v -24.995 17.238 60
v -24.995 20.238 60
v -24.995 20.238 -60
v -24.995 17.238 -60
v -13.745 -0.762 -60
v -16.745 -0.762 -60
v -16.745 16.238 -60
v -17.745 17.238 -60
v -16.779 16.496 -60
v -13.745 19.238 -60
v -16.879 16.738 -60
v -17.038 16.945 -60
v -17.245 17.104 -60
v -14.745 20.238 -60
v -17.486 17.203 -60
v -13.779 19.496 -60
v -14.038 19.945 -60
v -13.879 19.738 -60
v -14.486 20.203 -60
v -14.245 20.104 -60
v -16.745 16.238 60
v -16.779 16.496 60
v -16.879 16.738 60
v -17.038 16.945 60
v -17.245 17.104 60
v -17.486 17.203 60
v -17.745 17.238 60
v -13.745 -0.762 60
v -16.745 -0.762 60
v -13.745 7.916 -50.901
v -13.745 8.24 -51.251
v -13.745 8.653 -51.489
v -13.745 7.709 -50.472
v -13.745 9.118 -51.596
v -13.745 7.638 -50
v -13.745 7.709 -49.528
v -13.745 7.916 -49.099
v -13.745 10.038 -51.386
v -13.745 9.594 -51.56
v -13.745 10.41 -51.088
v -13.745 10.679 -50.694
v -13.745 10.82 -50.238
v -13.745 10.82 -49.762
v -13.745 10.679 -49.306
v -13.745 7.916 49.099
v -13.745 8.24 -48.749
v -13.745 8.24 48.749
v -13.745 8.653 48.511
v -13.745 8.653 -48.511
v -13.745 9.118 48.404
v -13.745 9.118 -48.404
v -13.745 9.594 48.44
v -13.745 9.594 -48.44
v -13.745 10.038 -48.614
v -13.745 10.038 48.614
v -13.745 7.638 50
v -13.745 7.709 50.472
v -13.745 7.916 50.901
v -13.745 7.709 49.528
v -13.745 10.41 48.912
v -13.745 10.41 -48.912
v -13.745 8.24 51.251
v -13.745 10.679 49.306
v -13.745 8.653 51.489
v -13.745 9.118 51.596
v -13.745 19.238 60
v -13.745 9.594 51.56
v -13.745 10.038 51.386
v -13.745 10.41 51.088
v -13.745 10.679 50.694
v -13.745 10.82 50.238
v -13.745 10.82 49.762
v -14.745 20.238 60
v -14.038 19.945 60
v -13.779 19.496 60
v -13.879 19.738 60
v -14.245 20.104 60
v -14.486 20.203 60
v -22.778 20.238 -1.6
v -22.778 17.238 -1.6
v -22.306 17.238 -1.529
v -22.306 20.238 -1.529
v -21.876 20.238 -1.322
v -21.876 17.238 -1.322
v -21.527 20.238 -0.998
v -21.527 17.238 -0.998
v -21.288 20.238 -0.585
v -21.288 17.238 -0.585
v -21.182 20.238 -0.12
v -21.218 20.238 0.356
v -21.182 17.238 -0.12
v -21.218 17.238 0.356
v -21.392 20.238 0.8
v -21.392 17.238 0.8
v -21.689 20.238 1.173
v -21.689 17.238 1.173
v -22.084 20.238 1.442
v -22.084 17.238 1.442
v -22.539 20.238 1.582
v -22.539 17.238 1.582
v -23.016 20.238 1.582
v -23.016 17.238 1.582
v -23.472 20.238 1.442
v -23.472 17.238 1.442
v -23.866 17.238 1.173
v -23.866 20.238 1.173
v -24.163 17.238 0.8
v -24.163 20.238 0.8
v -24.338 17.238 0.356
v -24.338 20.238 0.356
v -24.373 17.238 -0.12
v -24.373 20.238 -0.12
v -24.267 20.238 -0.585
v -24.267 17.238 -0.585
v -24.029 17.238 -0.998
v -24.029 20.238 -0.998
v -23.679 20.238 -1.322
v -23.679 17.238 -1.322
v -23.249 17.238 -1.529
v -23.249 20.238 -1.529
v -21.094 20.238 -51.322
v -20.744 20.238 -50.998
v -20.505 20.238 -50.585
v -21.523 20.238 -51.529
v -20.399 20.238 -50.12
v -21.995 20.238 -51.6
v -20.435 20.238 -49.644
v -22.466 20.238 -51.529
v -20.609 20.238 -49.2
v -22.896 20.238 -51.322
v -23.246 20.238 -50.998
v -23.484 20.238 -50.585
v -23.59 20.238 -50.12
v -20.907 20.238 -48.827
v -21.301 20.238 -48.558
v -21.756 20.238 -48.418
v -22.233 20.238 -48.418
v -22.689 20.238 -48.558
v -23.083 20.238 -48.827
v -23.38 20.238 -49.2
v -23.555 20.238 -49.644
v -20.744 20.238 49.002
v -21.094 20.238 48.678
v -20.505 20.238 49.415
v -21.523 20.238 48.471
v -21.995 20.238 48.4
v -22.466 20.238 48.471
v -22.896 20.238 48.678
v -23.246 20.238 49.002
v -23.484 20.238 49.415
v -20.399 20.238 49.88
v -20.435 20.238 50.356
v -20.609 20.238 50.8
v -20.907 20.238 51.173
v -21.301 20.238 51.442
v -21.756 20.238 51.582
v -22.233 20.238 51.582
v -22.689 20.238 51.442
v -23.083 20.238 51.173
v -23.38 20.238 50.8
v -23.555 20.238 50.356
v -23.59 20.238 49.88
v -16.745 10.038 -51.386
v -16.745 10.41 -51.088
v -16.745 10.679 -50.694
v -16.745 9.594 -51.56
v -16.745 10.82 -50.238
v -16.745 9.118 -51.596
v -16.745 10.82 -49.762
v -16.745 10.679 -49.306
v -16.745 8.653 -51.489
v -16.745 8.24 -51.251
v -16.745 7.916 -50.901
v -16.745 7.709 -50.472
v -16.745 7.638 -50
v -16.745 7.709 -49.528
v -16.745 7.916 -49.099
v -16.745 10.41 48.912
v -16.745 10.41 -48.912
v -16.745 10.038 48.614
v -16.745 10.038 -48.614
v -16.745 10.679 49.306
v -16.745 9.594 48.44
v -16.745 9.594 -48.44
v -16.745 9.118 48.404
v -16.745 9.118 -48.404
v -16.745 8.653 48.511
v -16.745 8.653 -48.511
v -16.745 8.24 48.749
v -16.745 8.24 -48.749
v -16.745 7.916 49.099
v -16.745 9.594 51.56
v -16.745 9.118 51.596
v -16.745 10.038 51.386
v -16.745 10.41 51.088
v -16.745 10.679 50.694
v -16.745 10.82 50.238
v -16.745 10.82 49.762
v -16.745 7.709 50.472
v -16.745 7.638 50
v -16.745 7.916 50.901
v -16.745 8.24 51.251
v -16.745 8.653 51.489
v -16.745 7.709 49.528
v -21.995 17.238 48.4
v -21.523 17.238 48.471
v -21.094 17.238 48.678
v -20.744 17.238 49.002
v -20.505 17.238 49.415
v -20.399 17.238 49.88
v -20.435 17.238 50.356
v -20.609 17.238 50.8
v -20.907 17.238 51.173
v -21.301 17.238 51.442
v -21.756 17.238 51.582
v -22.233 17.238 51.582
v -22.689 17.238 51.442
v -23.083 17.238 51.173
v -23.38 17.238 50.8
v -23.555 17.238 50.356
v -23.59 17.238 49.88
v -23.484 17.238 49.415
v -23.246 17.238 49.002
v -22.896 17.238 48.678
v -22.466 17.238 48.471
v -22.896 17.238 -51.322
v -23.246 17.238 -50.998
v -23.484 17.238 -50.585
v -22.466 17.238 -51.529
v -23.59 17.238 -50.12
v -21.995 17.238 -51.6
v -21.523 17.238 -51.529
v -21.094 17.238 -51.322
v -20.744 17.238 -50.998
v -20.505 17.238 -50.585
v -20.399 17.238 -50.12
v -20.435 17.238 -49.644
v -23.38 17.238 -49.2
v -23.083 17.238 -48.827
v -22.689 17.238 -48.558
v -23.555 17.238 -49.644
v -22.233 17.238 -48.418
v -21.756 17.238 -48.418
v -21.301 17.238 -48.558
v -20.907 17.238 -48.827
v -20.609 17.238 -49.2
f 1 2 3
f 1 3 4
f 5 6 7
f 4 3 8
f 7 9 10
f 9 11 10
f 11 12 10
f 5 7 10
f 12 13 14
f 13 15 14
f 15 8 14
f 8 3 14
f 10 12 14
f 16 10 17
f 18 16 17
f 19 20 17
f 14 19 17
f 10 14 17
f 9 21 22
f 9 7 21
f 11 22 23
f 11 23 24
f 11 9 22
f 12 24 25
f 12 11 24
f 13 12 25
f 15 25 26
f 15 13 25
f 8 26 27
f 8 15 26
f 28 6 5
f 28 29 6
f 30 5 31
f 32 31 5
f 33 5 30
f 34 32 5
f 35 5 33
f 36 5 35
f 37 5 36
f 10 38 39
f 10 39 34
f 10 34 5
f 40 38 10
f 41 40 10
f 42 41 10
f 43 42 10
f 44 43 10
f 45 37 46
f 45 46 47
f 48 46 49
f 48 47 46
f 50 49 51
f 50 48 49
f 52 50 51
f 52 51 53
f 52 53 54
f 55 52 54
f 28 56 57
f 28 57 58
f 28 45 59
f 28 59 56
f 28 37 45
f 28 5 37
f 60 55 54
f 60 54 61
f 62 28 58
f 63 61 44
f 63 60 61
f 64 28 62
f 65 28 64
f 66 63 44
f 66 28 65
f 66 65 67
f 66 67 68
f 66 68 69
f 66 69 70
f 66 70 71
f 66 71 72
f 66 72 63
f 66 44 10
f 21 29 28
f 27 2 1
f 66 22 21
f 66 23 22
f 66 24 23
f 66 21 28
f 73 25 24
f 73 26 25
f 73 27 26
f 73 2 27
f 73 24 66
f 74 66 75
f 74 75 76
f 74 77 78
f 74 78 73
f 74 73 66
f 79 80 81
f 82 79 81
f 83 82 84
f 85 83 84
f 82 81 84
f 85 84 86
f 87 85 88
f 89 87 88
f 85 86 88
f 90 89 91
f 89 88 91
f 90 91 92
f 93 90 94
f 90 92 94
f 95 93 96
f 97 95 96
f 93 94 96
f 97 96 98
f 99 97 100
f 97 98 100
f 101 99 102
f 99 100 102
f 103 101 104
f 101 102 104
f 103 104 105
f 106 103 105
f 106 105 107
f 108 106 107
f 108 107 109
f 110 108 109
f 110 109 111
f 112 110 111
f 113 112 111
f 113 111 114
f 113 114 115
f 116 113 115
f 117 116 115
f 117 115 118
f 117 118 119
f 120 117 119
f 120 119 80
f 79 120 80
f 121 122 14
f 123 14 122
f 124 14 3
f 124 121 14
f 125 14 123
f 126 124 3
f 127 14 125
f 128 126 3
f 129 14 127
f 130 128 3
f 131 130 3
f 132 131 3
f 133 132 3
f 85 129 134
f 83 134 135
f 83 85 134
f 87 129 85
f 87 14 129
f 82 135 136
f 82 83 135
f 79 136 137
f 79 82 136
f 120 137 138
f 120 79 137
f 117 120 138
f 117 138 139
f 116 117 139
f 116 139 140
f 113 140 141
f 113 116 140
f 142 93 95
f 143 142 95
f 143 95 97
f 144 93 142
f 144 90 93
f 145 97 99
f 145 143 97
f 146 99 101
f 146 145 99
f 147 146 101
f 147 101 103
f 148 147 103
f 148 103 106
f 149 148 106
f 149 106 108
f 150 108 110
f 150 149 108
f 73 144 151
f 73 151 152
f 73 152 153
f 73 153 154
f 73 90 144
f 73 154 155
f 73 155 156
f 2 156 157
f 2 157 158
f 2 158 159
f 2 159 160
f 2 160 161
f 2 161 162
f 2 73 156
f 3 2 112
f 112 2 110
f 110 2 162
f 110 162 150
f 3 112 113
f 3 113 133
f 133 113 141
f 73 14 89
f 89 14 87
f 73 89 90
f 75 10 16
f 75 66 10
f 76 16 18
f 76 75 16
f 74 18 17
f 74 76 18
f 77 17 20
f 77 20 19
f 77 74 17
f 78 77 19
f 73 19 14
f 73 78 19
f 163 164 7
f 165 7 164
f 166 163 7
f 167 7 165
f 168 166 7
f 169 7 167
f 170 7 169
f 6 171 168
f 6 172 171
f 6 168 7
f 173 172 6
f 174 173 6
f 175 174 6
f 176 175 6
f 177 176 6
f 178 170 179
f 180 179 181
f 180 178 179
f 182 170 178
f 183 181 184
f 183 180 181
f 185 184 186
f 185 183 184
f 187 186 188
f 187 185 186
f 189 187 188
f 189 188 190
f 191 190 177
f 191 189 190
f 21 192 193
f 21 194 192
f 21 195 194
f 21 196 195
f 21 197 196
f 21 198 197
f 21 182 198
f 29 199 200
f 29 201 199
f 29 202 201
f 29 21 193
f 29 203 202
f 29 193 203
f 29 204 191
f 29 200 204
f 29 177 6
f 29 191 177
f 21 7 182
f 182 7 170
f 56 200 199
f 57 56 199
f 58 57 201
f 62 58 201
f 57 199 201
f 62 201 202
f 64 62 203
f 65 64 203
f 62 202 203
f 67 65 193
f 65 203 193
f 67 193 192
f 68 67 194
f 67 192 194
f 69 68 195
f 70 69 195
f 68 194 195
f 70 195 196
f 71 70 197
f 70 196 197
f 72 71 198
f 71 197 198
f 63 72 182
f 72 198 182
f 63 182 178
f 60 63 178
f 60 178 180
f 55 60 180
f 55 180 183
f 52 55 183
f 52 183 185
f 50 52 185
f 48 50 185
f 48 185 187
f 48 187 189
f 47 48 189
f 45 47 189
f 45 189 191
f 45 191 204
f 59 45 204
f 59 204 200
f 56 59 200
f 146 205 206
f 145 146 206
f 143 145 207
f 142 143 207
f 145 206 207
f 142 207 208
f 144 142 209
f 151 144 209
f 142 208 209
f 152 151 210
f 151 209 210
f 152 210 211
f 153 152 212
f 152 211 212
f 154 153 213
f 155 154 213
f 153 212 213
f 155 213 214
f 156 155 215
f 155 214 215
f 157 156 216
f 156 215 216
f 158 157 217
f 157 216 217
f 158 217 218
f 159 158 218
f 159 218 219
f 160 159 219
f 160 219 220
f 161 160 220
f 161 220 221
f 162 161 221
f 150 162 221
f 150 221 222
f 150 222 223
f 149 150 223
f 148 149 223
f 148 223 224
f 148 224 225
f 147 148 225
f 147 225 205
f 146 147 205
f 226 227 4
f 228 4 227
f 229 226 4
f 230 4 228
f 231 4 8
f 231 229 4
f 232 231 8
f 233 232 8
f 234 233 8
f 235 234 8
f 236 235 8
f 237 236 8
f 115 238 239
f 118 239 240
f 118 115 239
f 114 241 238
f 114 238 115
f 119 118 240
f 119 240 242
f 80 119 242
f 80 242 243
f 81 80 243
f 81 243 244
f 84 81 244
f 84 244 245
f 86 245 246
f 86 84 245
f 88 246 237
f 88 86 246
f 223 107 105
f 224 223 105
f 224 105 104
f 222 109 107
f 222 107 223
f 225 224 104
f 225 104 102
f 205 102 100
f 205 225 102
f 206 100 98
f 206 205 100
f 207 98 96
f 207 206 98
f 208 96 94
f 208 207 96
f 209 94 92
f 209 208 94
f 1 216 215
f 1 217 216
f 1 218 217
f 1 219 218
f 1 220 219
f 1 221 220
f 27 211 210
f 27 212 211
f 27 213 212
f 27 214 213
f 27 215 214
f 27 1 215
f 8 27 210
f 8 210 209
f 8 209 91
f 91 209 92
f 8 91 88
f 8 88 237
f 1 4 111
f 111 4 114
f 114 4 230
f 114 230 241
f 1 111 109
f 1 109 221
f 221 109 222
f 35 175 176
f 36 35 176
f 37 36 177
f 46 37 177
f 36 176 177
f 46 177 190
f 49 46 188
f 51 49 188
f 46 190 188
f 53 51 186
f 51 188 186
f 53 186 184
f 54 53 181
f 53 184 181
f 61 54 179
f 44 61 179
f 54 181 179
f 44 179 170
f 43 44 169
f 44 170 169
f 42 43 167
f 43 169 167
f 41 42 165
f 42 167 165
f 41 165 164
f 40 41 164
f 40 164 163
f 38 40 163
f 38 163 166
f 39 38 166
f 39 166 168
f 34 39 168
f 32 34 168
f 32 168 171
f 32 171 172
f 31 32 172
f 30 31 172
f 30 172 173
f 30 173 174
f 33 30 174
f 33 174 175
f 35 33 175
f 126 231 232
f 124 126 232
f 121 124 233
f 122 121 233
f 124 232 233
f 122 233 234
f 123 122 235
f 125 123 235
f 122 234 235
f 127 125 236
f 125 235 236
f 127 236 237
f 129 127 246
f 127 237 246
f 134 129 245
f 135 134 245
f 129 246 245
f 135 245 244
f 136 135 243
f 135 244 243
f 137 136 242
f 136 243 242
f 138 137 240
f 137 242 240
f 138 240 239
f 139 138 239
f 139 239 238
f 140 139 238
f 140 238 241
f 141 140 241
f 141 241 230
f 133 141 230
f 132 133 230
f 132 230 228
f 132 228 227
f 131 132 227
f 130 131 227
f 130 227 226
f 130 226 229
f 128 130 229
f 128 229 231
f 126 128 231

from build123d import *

# Parameters (mm, degrees)
EXTRUDE_1_DEPTH     = 60
FILLET_2_R          = 1
FILLET_3_R          = 1
SKETCH_6_R          = 1.6
CUT_EXTRUDE_3_DEPTH = 10
SKETCH_7_R          = 1.6
SKETCH_7_R_2        = 3.879374182
CUT_EXTRUDE_4_DEPTH = 10


with BuildPart() as part:
    # 草图1 → 凸台-拉伸1 (new, symmetric)
    with BuildSketch(Plane.XY):
        Polygon((-13.744850262, -0.762431654), (-13.744850262, 20.237568346), (-24.994850262, 20.237568346), (-24.994850262, 17.237568346), (-16.744850262, 17.237568346), (-16.744850262, -0.762431654), align=None)
    extrude(amount=EXTRUDE_1_DEPTH, both=True)

    # 圆角2
    fillet_2_edges = [part.edges().sort_by_distance(p)[0] for p in [
        (-13.744850262, 20.237568346, 0),
    ]]
    fillet(fillet_2_edges, radius=FILLET_2_R)

    # 圆角3
    fillet_3_edges = [part.edges().sort_by_distance(p)[0] for p in [
        (-16.744850262, 17.237568346, 0),
    ]]
    fillet(fillet_3_edges, radius=FILLET_3_R)

    # 草图6 → 切除-拉伸3 (cut)
    with BuildSketch(Plane.ZY.offset(16.744850262)):
        with Locations(Location((50, 9.237568346, 0), (0, 0, 270))):
            Circle(SKETCH_6_R)
        with Locations(Location((-50, 9.237568346, 0), (0, 0, 270))):
            Circle(SKETCH_6_R)
    extrude(amount=-CUT_EXTRUDE_3_DEPTH, mode=Mode.SUBTRACT)

    # 草图7 → 切除-拉伸4 (cut)
    with BuildSketch(Plane.XZ.offset(-17.237568346)):
        with Locations(Location((-21.994850262, -50, 0), (0, 0, 270))):
            Circle(SKETCH_7_R)
        with Locations(Location((-21.994850262, 50, 0), (0, 0, 270))):
            Circle(SKETCH_7_R)
        with Locations(Location((-22.777733305, 0, 0), (0, 0, 270))):
            Circle(SKETCH_7_R)
        with Locations((-6.137965093, 23.424487804)):
            Circle(SKETCH_7_R_2)
    extrude(amount=-CUT_EXTRUDE_4_DEPTH, mode=Mode.SUBTRACT)


solid = part.part
